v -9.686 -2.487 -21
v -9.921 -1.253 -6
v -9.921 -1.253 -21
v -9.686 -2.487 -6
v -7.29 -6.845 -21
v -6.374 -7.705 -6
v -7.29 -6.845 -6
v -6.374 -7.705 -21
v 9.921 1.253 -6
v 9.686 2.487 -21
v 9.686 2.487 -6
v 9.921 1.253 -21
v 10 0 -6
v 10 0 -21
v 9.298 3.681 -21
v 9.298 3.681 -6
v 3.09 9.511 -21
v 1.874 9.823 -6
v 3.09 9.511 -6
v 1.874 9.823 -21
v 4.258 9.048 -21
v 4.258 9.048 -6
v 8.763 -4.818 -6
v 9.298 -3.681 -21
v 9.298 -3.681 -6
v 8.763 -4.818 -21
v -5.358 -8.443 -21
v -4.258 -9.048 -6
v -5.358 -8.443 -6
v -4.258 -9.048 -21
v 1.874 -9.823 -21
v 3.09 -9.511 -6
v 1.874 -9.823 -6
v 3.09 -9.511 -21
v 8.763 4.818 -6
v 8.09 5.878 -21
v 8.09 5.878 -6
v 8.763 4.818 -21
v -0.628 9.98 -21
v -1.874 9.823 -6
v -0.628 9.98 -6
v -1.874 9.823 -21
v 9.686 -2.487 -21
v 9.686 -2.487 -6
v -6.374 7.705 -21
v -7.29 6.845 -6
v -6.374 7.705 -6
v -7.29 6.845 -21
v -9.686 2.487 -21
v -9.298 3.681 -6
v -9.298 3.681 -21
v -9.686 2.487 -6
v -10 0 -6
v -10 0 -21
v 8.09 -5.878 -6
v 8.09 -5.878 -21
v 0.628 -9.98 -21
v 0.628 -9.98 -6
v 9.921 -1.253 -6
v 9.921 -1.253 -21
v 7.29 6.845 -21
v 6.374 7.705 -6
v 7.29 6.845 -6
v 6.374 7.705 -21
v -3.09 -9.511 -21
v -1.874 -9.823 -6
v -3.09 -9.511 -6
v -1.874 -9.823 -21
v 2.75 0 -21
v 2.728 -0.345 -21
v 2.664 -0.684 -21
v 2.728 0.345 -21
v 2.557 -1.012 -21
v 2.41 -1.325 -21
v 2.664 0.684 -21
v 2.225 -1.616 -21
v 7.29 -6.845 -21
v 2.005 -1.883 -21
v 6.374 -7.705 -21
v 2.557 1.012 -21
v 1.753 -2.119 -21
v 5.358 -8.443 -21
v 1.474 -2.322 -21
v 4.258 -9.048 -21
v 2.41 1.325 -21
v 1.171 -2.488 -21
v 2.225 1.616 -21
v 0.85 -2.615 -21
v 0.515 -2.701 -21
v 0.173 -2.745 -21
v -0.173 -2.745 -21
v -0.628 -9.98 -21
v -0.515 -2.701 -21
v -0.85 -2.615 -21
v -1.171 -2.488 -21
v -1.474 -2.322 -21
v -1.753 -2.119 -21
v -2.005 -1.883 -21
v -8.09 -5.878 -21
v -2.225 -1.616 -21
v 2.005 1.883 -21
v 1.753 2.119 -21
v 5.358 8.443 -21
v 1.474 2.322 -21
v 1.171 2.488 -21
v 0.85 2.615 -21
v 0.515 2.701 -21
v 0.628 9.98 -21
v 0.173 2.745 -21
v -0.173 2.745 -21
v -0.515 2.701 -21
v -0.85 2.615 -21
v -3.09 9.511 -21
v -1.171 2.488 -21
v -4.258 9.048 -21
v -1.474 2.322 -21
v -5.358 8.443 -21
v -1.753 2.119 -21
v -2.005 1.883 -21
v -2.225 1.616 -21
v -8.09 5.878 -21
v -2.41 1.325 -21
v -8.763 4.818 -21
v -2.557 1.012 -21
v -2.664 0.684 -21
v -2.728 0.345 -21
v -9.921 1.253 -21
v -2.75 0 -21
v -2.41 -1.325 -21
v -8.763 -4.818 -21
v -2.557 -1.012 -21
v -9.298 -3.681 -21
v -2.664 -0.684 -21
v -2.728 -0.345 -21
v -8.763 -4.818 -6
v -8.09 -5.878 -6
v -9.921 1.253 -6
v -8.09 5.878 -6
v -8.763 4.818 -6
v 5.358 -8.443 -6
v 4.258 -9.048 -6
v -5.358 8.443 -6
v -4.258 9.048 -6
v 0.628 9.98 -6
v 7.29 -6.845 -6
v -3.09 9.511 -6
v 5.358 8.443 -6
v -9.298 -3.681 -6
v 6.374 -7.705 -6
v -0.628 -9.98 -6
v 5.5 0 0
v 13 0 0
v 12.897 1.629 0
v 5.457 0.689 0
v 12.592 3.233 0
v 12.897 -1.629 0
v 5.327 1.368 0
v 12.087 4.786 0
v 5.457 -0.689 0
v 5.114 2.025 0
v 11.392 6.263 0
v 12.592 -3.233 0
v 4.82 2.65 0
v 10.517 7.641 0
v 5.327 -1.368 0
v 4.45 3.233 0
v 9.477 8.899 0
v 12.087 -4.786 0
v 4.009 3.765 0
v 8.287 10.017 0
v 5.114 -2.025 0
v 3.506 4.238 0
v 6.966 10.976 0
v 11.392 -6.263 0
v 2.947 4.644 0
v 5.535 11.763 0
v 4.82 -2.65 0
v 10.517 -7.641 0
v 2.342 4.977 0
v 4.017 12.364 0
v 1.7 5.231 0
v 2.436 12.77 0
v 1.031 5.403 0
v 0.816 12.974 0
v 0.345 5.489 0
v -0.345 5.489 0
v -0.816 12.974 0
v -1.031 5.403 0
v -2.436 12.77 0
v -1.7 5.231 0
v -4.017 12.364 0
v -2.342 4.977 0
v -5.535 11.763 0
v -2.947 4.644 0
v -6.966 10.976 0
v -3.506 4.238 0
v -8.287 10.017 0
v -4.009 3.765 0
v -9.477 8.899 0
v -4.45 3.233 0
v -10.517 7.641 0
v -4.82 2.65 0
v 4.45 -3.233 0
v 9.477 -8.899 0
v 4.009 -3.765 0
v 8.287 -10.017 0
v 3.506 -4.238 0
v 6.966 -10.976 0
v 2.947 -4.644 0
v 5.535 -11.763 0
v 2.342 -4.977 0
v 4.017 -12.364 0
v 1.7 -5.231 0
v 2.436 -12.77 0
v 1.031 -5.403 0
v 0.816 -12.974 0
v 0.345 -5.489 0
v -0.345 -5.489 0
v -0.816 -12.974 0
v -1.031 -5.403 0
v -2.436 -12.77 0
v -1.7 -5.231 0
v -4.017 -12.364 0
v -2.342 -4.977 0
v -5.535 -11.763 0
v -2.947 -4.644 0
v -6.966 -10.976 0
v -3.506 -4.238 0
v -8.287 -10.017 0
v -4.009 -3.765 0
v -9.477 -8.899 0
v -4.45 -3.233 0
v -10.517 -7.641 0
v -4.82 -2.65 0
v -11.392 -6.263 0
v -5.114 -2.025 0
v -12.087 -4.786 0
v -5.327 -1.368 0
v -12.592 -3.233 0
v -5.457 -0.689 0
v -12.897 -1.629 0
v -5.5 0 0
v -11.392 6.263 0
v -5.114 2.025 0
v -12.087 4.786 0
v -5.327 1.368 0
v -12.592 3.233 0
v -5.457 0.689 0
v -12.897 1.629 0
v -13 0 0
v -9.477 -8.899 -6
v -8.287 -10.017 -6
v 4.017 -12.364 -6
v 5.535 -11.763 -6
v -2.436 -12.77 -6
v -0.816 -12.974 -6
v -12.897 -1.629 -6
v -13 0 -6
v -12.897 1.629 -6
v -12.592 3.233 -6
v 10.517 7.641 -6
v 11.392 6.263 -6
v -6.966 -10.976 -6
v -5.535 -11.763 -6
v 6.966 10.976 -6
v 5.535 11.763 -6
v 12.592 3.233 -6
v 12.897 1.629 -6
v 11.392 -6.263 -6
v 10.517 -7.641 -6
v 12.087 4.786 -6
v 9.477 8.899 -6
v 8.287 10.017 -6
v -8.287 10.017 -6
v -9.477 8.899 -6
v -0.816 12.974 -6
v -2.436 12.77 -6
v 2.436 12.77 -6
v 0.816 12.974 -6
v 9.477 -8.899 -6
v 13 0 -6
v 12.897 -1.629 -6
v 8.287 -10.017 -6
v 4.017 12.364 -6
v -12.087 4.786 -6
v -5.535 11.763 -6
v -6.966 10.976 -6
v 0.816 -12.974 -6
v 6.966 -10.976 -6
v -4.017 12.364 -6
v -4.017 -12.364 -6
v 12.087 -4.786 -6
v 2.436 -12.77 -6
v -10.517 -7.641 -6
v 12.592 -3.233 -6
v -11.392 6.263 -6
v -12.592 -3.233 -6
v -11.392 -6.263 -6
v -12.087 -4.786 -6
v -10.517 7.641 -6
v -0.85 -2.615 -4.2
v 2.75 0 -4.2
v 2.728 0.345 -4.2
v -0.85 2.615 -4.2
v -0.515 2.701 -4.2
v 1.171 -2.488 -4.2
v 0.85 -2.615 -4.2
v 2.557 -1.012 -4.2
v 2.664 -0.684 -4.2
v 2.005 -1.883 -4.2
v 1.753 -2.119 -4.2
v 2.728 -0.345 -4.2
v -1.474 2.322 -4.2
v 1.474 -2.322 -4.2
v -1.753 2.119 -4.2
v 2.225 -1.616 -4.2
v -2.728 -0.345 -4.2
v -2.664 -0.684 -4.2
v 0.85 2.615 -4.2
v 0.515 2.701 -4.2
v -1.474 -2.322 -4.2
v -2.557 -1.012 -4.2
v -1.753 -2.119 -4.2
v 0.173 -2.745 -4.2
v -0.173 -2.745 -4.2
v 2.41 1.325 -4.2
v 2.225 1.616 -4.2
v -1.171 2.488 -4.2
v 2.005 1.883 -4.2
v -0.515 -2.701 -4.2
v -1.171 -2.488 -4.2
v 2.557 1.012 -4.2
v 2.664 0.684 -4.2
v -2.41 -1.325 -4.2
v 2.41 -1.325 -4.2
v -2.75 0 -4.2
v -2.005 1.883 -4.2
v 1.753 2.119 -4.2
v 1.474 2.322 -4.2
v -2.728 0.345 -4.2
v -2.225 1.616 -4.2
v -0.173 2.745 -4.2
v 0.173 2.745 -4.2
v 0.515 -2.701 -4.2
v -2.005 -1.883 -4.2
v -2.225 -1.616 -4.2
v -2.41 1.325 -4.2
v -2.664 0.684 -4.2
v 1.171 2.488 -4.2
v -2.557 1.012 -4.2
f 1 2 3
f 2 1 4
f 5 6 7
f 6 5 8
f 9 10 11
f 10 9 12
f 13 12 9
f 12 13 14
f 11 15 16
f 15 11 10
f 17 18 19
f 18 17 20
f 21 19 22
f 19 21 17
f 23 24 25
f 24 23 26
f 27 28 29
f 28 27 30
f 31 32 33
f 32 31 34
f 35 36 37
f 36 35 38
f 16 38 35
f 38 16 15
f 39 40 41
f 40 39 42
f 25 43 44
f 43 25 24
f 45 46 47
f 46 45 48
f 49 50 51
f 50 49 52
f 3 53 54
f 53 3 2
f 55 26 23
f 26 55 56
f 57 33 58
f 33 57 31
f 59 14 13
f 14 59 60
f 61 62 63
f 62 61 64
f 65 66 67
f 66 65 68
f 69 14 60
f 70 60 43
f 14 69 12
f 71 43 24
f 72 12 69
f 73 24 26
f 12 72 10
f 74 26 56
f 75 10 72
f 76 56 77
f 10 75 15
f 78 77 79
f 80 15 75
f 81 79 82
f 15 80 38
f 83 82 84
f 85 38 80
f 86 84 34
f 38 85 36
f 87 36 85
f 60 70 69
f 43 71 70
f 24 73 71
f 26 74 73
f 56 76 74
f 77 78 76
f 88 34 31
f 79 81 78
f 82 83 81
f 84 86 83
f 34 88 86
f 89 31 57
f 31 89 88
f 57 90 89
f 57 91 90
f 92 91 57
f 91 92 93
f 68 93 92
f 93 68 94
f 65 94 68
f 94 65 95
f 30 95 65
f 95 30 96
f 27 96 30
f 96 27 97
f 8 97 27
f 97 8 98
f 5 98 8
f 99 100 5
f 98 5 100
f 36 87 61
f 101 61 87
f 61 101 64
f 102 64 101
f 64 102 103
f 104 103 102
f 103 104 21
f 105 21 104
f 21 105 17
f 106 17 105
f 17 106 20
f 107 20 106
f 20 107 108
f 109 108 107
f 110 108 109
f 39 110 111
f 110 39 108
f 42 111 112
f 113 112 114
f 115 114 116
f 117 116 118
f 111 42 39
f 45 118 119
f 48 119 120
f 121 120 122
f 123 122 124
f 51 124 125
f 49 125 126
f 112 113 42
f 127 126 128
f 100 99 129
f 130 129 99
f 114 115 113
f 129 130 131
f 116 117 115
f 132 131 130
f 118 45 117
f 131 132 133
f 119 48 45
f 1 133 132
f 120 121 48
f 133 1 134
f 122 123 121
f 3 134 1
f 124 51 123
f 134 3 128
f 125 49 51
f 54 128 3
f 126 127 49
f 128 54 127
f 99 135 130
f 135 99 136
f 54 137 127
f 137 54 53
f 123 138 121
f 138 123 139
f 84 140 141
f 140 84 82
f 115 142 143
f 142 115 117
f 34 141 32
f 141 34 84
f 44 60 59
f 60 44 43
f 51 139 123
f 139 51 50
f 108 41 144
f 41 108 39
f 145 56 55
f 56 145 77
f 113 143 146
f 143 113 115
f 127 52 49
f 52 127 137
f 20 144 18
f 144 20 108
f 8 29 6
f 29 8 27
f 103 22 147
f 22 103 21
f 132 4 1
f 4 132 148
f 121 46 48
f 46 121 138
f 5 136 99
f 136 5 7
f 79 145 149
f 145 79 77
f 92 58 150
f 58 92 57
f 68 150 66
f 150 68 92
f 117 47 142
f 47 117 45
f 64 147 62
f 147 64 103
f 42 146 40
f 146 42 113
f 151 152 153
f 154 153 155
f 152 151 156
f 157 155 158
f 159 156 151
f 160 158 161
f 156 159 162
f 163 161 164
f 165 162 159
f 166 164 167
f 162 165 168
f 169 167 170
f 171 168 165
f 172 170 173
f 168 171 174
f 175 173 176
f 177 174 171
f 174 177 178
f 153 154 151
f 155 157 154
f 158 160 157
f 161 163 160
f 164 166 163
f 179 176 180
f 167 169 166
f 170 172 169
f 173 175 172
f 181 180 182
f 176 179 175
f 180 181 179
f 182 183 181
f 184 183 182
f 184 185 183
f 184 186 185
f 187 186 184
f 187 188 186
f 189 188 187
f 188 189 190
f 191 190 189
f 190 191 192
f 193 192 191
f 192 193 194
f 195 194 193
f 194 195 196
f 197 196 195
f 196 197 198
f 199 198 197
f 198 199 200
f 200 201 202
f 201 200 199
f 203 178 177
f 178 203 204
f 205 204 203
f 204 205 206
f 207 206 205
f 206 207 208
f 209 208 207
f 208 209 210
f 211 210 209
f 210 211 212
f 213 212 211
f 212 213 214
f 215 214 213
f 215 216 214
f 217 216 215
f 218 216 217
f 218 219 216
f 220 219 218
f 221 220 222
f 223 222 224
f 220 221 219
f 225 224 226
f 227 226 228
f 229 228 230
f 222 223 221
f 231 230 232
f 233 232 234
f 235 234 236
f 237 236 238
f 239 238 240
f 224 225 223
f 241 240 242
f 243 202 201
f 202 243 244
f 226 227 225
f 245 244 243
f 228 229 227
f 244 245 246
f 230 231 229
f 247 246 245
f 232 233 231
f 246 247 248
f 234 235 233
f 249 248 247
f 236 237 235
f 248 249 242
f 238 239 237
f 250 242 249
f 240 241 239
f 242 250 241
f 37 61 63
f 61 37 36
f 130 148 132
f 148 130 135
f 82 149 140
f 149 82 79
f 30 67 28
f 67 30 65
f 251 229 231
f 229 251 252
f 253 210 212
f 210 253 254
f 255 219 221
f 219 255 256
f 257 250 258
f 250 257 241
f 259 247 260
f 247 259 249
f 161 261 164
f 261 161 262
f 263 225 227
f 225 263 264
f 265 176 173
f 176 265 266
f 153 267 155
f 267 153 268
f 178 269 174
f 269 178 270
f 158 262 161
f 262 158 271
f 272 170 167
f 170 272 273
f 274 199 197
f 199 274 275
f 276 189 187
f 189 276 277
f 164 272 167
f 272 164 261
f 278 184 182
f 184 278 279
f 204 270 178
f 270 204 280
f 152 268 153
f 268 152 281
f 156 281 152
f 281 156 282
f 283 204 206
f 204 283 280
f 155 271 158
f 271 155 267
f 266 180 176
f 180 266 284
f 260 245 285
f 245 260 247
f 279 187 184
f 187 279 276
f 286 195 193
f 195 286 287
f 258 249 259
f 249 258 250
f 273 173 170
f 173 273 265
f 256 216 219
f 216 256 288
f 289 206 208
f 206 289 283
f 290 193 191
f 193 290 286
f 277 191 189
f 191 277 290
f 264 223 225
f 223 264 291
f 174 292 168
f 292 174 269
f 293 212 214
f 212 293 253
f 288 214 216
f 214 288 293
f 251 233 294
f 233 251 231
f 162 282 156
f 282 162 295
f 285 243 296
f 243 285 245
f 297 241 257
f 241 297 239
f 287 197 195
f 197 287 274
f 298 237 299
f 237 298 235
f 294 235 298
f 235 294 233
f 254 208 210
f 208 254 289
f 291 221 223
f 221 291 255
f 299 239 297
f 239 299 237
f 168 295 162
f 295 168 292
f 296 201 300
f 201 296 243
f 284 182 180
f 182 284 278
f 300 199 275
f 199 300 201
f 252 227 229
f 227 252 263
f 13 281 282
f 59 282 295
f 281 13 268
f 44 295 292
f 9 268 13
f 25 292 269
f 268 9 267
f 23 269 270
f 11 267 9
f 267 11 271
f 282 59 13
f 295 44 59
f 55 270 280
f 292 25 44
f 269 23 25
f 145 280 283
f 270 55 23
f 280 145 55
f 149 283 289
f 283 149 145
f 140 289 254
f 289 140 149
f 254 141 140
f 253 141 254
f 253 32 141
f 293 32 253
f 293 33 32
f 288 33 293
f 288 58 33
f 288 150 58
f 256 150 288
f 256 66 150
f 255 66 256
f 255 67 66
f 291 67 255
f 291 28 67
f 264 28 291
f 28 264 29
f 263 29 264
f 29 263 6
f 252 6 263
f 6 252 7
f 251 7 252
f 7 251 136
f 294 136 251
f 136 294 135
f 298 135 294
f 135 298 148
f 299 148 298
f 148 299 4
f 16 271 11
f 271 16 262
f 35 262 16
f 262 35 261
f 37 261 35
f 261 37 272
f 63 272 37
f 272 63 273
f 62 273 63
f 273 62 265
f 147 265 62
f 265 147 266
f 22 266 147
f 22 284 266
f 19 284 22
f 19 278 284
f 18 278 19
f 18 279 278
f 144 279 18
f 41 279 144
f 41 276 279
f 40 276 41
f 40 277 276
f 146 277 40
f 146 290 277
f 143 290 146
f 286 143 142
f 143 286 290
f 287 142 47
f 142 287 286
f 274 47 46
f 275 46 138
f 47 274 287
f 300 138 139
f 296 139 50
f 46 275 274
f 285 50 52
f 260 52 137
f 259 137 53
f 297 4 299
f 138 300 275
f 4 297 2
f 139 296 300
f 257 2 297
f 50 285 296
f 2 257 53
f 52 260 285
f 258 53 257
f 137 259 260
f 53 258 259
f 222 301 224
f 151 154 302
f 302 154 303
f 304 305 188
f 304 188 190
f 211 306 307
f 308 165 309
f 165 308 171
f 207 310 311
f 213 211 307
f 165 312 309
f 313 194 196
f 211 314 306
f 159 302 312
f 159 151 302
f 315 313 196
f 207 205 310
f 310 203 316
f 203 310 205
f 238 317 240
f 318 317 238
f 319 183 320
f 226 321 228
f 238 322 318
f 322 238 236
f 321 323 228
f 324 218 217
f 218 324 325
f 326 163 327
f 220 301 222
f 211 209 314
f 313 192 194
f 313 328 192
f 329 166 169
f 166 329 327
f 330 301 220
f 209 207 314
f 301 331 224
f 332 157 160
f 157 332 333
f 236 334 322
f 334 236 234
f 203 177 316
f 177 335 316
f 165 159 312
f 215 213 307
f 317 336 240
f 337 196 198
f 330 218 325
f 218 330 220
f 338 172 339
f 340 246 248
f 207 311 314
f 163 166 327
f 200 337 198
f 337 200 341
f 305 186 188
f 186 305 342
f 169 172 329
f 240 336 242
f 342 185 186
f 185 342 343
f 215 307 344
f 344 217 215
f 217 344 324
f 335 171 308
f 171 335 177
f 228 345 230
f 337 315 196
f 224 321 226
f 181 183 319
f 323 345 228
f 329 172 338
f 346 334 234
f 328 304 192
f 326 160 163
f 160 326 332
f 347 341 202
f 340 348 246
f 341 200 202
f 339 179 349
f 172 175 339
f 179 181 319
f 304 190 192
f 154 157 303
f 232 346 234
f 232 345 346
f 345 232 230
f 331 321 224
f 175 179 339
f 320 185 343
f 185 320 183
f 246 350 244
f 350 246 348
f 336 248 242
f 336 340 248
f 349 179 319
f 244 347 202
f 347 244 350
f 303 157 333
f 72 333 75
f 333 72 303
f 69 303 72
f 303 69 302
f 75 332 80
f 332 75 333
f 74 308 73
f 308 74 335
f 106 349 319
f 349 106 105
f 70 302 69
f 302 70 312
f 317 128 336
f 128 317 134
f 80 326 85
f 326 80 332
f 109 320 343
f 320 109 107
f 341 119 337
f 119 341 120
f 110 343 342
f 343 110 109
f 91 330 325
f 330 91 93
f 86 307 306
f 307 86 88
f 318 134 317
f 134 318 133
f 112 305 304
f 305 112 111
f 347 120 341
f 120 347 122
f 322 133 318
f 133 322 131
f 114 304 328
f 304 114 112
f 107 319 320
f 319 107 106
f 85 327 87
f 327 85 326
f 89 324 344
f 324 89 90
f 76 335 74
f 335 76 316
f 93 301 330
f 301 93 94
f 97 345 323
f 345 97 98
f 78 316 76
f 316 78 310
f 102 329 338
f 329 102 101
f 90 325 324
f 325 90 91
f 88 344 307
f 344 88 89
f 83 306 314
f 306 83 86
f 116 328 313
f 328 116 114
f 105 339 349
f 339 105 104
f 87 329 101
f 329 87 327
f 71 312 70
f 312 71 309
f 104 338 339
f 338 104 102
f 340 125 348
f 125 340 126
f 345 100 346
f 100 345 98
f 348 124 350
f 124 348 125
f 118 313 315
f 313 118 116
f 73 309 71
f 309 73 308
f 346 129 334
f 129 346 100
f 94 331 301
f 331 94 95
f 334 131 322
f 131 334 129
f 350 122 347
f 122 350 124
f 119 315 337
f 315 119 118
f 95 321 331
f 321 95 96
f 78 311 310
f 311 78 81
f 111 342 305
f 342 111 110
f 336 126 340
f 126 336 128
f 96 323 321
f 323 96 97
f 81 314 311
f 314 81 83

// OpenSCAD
$fn = 50;


difference() {
	union() {
		translate(v = [0, 0, -21.0000000000]) {
			cylinder(h = 21, r = 10.0000000000);
		}
		translate(v = [0, 0, -6.0000000000]) {
			cylinder(h = 6, r = 13.0000000000);
		}
	}
	union() {
		translate(v = [0, 0, 0]) {
			rotate(a = [0, 0, 0]) {
				difference() {
					union() {
						#translate(v = [0, 0, -21.0000000000]) {
							cylinder(h = 21, r = 2.2500000000);
						}
						#translate(v = [0, 0, -4.2000000000]) {
							cylinder(h = 4.2000000000, r1 = 2.7500000000, r2 = 5.5000000000);
						}
						#translate(v = [0, 0, -21.0000000000]) {
							cylinder(h = 21, r = 2.7500000000);
						}
						#translate(v = [0, 0, -21.0000000000]) {
							cylinder(h = 21, r = 2.2500000000);
						}
					}
					union();
				}
			}
		}
	}
}
